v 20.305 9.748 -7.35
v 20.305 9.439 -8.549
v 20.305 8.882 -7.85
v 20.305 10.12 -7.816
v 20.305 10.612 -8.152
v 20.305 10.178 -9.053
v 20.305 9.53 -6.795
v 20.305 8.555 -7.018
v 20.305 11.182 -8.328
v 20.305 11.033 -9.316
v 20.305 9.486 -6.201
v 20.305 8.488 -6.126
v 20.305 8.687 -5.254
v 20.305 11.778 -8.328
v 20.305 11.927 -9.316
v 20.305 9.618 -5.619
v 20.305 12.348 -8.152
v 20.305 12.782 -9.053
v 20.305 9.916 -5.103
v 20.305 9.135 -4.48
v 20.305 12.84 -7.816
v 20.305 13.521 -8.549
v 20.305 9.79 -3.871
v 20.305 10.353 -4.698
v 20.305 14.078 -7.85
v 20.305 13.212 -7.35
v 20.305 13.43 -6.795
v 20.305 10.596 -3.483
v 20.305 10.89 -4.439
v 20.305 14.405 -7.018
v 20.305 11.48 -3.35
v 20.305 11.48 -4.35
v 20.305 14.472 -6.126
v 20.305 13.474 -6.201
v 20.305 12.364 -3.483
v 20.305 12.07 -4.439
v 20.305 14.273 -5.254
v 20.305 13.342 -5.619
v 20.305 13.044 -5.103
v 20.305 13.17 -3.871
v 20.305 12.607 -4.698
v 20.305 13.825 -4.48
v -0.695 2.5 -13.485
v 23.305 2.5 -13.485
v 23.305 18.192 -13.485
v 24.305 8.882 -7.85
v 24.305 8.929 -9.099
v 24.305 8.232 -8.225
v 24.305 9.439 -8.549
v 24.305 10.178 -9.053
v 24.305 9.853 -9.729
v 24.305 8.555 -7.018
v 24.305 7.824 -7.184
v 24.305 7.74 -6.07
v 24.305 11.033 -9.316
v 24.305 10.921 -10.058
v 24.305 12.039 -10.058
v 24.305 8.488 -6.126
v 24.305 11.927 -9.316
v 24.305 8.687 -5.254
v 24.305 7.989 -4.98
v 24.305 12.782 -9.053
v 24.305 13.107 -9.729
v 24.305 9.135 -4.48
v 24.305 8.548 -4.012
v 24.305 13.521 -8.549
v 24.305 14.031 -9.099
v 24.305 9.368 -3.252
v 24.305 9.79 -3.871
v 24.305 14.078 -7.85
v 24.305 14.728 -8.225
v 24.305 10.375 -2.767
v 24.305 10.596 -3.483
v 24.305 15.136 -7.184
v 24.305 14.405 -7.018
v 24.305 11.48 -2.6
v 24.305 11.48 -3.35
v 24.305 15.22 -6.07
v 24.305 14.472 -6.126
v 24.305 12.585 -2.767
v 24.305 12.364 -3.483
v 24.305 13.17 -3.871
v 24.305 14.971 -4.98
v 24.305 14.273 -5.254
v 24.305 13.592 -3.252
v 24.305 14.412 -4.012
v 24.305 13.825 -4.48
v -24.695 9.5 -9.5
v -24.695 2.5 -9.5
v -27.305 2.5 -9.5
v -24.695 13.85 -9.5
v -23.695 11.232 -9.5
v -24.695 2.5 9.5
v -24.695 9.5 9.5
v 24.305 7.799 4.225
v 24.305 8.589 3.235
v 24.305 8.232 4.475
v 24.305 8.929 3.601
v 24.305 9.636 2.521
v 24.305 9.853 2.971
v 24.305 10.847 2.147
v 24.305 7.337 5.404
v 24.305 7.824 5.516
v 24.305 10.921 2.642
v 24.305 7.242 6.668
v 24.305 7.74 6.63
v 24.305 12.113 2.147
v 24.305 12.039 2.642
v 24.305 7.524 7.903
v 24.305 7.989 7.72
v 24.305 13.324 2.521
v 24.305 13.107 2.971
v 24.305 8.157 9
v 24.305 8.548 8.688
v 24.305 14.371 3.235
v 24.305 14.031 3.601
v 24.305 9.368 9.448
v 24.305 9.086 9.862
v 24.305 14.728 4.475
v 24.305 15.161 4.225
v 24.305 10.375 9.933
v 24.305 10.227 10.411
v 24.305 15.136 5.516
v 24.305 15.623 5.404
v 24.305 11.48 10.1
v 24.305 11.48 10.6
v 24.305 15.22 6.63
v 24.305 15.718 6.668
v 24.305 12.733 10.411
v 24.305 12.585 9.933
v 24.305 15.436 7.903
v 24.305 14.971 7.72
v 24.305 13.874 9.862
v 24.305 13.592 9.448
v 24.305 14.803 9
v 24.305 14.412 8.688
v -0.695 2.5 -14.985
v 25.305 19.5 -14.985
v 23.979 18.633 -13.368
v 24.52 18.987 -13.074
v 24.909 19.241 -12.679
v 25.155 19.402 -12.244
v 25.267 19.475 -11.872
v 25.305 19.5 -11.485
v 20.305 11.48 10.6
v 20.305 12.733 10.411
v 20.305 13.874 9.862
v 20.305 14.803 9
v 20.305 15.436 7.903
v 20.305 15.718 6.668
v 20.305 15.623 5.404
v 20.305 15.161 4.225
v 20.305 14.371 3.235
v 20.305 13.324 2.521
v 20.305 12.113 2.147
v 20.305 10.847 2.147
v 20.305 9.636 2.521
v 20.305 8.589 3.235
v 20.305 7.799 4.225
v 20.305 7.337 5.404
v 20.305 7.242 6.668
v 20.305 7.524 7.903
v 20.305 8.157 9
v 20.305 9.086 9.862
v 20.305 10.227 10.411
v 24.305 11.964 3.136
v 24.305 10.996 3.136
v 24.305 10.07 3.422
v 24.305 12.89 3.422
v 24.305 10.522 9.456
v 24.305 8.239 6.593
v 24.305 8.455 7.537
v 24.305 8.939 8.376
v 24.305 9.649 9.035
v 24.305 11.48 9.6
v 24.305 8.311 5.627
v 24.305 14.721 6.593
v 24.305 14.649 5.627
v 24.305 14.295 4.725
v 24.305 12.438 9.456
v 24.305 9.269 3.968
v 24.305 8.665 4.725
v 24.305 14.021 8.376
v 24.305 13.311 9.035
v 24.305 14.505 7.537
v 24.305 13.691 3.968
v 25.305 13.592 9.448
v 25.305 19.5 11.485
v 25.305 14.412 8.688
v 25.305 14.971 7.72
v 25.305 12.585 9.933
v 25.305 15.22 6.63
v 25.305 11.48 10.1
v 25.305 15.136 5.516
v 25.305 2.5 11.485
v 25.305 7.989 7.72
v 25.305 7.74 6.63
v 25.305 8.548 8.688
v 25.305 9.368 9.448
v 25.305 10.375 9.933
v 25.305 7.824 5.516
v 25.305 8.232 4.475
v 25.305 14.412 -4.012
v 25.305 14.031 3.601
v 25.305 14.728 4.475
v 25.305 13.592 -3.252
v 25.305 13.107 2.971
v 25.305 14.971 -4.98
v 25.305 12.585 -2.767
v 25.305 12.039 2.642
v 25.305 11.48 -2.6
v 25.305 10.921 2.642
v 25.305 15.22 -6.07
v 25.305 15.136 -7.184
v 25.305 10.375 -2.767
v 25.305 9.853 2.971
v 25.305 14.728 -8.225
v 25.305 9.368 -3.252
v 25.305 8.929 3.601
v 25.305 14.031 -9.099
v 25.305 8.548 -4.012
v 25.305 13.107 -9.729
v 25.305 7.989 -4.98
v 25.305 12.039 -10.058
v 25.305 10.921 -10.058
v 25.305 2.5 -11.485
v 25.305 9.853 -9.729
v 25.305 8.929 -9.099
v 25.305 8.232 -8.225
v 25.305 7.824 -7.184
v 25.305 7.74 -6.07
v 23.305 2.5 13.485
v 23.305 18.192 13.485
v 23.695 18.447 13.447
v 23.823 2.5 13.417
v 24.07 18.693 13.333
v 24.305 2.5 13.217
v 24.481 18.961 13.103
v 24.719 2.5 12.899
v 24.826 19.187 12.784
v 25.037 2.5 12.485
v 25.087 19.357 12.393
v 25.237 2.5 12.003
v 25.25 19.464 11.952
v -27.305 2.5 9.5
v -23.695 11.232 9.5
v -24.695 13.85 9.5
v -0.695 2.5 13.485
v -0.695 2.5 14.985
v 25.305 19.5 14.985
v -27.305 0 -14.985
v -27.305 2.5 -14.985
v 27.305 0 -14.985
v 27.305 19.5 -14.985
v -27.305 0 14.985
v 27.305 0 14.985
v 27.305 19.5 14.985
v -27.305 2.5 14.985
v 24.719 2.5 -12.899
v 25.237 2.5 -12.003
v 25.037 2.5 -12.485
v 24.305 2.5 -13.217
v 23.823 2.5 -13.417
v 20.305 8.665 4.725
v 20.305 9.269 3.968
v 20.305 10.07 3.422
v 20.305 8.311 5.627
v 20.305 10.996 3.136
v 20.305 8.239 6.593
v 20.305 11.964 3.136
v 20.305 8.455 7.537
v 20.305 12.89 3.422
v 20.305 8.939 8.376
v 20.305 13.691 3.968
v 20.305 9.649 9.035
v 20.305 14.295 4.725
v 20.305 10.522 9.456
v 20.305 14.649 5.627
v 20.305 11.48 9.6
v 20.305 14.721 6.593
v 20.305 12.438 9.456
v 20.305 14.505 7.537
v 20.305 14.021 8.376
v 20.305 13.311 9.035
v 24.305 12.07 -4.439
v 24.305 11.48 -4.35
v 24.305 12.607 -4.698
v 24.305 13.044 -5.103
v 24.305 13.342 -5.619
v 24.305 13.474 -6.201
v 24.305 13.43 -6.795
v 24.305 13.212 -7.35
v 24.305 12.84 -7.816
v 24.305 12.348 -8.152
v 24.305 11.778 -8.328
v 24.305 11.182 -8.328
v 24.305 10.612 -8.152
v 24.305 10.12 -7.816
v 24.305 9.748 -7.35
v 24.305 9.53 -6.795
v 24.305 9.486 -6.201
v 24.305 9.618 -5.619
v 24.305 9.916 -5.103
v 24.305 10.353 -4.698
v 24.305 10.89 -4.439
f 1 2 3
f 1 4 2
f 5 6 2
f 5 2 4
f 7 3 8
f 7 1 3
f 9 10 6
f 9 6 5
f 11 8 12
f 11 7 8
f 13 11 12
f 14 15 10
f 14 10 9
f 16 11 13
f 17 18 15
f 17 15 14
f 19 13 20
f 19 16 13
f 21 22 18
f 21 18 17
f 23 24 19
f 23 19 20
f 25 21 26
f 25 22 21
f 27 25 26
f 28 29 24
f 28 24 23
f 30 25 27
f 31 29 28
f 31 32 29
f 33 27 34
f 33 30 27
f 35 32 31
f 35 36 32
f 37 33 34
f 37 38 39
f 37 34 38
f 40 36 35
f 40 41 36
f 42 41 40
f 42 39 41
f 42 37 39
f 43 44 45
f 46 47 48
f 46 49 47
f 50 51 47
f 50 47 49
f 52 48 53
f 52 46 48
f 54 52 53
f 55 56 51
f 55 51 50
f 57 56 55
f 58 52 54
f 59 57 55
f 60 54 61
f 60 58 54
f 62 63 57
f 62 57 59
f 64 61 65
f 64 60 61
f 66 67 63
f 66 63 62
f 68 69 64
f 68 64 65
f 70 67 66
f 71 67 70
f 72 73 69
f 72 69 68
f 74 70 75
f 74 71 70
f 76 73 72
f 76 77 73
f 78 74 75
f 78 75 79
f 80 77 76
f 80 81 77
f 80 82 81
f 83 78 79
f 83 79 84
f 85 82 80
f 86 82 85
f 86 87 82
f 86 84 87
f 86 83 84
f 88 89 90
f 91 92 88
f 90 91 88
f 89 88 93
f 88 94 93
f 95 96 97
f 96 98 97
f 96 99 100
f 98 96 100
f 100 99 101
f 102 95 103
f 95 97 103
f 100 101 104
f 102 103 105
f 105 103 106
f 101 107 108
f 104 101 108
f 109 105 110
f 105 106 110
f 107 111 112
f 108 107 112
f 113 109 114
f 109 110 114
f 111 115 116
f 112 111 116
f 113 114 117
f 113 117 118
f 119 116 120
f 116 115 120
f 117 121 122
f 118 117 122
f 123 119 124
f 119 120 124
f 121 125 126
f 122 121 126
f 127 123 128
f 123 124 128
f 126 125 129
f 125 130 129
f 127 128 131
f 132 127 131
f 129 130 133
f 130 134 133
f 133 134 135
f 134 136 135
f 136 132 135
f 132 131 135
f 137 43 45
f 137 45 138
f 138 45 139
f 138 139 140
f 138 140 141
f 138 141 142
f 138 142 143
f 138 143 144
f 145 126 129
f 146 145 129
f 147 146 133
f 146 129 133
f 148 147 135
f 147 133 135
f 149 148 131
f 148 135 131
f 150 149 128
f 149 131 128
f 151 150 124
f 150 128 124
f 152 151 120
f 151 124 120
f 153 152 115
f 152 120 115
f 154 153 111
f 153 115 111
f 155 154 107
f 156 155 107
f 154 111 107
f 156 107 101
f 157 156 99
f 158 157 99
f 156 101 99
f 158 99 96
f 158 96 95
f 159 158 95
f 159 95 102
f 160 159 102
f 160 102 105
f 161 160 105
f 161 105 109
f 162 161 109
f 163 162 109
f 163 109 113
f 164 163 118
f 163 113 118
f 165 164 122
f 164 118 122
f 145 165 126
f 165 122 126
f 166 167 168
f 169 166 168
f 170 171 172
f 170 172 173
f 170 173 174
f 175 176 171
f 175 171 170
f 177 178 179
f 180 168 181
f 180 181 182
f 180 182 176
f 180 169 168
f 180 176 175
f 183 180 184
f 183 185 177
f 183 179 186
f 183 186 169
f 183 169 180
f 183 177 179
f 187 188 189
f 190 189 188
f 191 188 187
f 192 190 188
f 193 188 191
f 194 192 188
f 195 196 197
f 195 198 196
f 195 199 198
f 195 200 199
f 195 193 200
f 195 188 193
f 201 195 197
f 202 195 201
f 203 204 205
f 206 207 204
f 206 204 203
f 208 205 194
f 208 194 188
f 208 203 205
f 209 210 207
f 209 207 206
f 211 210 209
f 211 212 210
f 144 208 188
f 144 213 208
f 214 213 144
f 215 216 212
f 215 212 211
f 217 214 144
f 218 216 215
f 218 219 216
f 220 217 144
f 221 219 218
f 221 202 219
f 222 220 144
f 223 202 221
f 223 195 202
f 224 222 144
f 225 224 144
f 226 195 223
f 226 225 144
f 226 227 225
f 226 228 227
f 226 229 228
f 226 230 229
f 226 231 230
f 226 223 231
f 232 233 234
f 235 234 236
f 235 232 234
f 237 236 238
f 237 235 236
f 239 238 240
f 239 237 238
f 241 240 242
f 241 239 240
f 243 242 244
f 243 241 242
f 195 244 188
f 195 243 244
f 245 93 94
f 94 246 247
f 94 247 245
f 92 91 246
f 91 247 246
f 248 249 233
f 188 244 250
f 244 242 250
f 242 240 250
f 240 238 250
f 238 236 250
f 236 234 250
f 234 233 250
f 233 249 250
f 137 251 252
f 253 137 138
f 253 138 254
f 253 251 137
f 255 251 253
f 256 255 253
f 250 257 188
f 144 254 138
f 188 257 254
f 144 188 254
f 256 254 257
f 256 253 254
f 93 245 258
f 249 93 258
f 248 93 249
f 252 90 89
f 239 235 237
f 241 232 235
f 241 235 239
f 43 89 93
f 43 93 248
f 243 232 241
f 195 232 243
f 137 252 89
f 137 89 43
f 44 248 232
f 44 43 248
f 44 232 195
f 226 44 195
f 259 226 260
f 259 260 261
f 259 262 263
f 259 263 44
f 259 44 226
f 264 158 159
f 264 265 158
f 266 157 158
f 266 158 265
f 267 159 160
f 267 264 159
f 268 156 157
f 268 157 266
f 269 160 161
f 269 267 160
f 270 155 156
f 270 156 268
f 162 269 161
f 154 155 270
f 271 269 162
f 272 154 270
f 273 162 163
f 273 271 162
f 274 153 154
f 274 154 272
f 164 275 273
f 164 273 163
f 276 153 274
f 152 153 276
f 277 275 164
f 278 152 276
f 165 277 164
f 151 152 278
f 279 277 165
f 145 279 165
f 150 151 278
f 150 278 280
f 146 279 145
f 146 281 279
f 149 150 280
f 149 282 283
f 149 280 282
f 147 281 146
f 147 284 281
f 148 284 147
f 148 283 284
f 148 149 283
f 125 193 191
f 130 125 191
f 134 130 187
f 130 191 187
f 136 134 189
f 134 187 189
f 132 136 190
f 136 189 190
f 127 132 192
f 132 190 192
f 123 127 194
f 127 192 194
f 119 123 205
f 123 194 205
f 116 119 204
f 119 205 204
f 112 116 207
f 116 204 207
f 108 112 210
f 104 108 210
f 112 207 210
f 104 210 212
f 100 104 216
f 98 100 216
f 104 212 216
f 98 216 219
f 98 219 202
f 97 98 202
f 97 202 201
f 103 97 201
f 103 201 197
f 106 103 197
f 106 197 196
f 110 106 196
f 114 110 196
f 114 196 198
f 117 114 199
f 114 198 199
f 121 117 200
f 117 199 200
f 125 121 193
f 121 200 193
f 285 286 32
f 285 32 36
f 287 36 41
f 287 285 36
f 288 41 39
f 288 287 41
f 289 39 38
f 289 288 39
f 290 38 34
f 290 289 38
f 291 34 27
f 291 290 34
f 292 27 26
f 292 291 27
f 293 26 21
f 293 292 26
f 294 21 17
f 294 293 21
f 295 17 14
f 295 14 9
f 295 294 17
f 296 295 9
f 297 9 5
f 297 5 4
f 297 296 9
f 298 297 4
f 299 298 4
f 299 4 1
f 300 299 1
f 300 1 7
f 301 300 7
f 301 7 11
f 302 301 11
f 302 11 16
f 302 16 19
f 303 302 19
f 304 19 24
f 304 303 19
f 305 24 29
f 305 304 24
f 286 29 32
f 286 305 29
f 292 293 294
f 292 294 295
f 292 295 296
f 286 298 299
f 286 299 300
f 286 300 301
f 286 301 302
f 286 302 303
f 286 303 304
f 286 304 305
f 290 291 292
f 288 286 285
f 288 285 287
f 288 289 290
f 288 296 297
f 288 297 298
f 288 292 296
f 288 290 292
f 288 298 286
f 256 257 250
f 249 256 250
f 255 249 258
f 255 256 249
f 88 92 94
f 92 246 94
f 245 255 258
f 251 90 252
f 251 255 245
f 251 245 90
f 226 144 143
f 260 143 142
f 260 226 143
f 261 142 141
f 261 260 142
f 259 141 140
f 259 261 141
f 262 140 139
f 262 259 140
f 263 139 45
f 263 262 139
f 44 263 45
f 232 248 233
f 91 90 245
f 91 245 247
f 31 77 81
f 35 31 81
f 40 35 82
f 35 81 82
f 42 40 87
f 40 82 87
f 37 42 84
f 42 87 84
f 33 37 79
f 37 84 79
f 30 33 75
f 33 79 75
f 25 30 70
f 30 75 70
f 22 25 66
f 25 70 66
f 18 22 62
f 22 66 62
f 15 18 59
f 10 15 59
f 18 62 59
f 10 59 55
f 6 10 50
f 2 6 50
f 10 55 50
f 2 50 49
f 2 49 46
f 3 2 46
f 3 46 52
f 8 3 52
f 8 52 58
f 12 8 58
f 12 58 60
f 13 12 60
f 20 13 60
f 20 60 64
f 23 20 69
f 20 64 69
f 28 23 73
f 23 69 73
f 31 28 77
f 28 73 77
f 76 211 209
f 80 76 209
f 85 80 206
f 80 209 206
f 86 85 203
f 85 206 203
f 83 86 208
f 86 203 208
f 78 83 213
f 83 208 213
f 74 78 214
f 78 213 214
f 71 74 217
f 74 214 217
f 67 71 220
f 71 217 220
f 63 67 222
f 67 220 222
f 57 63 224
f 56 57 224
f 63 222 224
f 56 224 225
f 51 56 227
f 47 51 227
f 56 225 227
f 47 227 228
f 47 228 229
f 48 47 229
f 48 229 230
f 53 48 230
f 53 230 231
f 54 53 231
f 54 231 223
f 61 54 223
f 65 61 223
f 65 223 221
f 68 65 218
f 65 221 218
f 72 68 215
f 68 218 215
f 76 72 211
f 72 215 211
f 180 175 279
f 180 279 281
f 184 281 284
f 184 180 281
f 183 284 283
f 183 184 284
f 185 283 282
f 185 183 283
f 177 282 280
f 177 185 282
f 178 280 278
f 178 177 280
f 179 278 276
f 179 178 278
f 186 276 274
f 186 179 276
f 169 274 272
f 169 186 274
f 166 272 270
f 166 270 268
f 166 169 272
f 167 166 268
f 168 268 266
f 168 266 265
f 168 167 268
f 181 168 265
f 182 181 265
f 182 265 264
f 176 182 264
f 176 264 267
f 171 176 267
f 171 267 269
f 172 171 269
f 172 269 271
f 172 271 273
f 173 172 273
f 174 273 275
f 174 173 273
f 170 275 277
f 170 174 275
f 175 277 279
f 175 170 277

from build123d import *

# Parameters (mm, degrees)
SKETCH_1_W           = 54.61
SKETCH_1_H           = 29.97
EXTRUDE_1_DEPTH      = 2.5
EXTRUDE_2_DEPTH      = 17
CUT_EXTRUDE_1_DEPTH  = 30.97
EXTRUDE_4_DEPTH      = 9.5
EXTRUDE_4_DEPTH_BACK = 9.5
SKETCH_10_R          = 3.75
EXTRUDE_6_DEPTH      = 1
SKETCH_11_R          = 3
SKETCH_11_R_2        = 2
EXTRUDE_7_DEPTH      = 4
SKETCH_12_R          = 4.25
SKETCH_12_R_2        = 3.25
EXTRUDE_8_DEPTH      = 4


with BuildPart() as part:
    # Эскиз1 → Бобышка-Вытянуть1 (new body)
    with BuildSketch(Plane(origin=(0, 0, 0), x_dir=(1, 0, 0), z_dir=(0, 1, 0))):
        Rectangle(SKETCH_1_W, SKETCH_1_H)
    extrude(amount=EXTRUDE_1_DEPTH)

    # Эскиз2 → Бобышка-Вытянуть2 (add)
    with BuildSketch(Plane(origin=(0, 2.5, 0), x_dir=(1, 0, 0), z_dir=(0, 1, 0))):
        with BuildLine():
            Line((27.305, -14.985), (-0.695, -14.985))
            Line((-0.695, -14.985), (-0.695, -13.485))
            Line((-0.695, -13.485), (23.305, -13.485))
            ThreePointArc((23.305, -13.485), (24.719213562, -12.899213562), (25.305, -11.485))
            Line((25.305, -11.485), (25.305, 11.485))
            ThreePointArc((25.305, 11.485), (24.719213562, 12.899213562), (23.305, 13.485))
            Line((23.305, 13.485), (-0.695, 13.485))
            Line((-0.695, 13.485), (-0.695, 14.985))
            Line((-0.695, 14.985), (27.305, 14.985))
            Line((27.305, 14.985), (27.305, -14.985))
        make_face()
    extrude(amount=EXTRUDE_2_DEPTH)

    # Эскиз3 → Вырез-Вытянуть1 (cut, through all)
    with BuildSketch(Plane.XY.offset(14.985)):
        Polygon((-0.695, 2.5), (25.305, 19.5), (-0.695, 19.5), align=None)
    extrude(amount=-CUT_EXTRUDE_1_DEPTH, mode=Mode.SUBTRACT)

    # Эскиз8 → Бобышка-Вытянуть4 (add, two sides)
    with BuildSketch(Plane.XY) as extrude_4_sk:
        Polygon((-27.305, 2.5), (-24.695, 13.85), (-23.695, 11.232050808), (-24.695, 9.5), (-24.695, 2.5), align=None)
    extrude(amount=EXTRUDE_4_DEPTH)
    extrude(extrude_4_sk.sketch, amount=-EXTRUDE_4_DEPTH_BACK)

    # Эскиз10 → Бобышка-Вытянуть6 (add)
    with BuildSketch(Plane.ZY.offset(-25.305)):
        with Locations((-6.35, 11.48)):
            Circle(SKETCH_10_R)
        with Locations((6.35, 11.48)):
            Circle(SKETCH_10_R)
    extrude(amount=EXTRUDE_6_DEPTH)

    # Эскиз11 → Бобышка-Вытянуть7 (add)
    with BuildSketch(Plane.ZY.offset(-24.305)):
        with Locations((-6.35, 11.48)):
            Circle(SKETCH_11_R)
        with Locations((-6.35, 11.48)):
            Circle(SKETCH_11_R_2, mode=Mode.SUBTRACT)
    extrude(amount=EXTRUDE_7_DEPTH)

    # Эскиз12 → Бобышка-Вытянуть8 (add)
    with BuildSketch(Plane.ZY.offset(-24.305)):
        with Locations((6.35, 11.48)):
            Circle(SKETCH_12_R)
        with Locations((6.35, 11.48)):
            Circle(SKETCH_12_R_2, mode=Mode.SUBTRACT)
    extrude(amount=EXTRUDE_8_DEPTH)


solid = part.part
